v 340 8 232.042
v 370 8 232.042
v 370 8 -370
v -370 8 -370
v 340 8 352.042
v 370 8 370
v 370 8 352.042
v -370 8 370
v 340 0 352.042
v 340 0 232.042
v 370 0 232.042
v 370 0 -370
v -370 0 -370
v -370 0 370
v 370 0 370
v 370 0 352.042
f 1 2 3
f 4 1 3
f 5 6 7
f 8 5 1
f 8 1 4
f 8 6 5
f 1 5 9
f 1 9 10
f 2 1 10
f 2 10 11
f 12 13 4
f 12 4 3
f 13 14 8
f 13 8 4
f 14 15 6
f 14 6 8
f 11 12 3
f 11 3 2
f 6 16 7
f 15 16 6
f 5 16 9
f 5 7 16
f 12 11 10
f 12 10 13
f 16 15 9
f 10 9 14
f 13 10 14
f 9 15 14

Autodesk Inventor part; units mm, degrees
ref_plane "YZ Plane" through (0, 0, 0) normal (1, 0, 0) x (0, 1, 0)
ref_plane "XZ Plane" through (0, 0, 0) normal (0, 1, 0) x (-1, 0, 0)
ref_plane "XY Plane" through (0, 0, 0) normal (0, 0, 1) x (1, 0, 0)
sketch "Эскиз1" plane through (0, 0, 0) normal (0, 1, 0) x (-1, 0, 0)
  line L0 (-370, 370) -> (370, 370)
  line L1 (370, 370) -> (370, -370)
  line L2 (370, -370) -> (-370, -370)
  line L3 (-370, -370) -> (-370, 370)
  line L4 (-370, 370) -> (370, -370) construction
  line L5 (370, 370) -> (-370, -370) construction
  point P0 (0, 0)
  dimension "d0" = 740
  dimension "d1" = 740
extrude "Выдавливание1" add sketch "Эскиз1" along normal blind 8
sketch "Эскиз2" plane through (0, 8, 0) normal (0, 1, 0) x (1, 0, 0)
  line L0 (370, -370) -> (370, 370) projected
  line L1 (370, -352.0422) -> (340, -352.0422)
  line L2 (340, -352.0422) -> (340, -232.0422)
  line L3 (340, -232.0422) -> (370, -232.0422)
  line L4 (370, -232.0422) -> (370, -352.0422)
  point P0 (0, 0)
  dimension "d4" = 30
  dimension "d5" = 120
extrude "Выдавливание2" cut sketch "Эскиз2" against normal blind 8
properties part number "КВ33.044.005 - Крышка блока управления" material "Дерево (береза)"
